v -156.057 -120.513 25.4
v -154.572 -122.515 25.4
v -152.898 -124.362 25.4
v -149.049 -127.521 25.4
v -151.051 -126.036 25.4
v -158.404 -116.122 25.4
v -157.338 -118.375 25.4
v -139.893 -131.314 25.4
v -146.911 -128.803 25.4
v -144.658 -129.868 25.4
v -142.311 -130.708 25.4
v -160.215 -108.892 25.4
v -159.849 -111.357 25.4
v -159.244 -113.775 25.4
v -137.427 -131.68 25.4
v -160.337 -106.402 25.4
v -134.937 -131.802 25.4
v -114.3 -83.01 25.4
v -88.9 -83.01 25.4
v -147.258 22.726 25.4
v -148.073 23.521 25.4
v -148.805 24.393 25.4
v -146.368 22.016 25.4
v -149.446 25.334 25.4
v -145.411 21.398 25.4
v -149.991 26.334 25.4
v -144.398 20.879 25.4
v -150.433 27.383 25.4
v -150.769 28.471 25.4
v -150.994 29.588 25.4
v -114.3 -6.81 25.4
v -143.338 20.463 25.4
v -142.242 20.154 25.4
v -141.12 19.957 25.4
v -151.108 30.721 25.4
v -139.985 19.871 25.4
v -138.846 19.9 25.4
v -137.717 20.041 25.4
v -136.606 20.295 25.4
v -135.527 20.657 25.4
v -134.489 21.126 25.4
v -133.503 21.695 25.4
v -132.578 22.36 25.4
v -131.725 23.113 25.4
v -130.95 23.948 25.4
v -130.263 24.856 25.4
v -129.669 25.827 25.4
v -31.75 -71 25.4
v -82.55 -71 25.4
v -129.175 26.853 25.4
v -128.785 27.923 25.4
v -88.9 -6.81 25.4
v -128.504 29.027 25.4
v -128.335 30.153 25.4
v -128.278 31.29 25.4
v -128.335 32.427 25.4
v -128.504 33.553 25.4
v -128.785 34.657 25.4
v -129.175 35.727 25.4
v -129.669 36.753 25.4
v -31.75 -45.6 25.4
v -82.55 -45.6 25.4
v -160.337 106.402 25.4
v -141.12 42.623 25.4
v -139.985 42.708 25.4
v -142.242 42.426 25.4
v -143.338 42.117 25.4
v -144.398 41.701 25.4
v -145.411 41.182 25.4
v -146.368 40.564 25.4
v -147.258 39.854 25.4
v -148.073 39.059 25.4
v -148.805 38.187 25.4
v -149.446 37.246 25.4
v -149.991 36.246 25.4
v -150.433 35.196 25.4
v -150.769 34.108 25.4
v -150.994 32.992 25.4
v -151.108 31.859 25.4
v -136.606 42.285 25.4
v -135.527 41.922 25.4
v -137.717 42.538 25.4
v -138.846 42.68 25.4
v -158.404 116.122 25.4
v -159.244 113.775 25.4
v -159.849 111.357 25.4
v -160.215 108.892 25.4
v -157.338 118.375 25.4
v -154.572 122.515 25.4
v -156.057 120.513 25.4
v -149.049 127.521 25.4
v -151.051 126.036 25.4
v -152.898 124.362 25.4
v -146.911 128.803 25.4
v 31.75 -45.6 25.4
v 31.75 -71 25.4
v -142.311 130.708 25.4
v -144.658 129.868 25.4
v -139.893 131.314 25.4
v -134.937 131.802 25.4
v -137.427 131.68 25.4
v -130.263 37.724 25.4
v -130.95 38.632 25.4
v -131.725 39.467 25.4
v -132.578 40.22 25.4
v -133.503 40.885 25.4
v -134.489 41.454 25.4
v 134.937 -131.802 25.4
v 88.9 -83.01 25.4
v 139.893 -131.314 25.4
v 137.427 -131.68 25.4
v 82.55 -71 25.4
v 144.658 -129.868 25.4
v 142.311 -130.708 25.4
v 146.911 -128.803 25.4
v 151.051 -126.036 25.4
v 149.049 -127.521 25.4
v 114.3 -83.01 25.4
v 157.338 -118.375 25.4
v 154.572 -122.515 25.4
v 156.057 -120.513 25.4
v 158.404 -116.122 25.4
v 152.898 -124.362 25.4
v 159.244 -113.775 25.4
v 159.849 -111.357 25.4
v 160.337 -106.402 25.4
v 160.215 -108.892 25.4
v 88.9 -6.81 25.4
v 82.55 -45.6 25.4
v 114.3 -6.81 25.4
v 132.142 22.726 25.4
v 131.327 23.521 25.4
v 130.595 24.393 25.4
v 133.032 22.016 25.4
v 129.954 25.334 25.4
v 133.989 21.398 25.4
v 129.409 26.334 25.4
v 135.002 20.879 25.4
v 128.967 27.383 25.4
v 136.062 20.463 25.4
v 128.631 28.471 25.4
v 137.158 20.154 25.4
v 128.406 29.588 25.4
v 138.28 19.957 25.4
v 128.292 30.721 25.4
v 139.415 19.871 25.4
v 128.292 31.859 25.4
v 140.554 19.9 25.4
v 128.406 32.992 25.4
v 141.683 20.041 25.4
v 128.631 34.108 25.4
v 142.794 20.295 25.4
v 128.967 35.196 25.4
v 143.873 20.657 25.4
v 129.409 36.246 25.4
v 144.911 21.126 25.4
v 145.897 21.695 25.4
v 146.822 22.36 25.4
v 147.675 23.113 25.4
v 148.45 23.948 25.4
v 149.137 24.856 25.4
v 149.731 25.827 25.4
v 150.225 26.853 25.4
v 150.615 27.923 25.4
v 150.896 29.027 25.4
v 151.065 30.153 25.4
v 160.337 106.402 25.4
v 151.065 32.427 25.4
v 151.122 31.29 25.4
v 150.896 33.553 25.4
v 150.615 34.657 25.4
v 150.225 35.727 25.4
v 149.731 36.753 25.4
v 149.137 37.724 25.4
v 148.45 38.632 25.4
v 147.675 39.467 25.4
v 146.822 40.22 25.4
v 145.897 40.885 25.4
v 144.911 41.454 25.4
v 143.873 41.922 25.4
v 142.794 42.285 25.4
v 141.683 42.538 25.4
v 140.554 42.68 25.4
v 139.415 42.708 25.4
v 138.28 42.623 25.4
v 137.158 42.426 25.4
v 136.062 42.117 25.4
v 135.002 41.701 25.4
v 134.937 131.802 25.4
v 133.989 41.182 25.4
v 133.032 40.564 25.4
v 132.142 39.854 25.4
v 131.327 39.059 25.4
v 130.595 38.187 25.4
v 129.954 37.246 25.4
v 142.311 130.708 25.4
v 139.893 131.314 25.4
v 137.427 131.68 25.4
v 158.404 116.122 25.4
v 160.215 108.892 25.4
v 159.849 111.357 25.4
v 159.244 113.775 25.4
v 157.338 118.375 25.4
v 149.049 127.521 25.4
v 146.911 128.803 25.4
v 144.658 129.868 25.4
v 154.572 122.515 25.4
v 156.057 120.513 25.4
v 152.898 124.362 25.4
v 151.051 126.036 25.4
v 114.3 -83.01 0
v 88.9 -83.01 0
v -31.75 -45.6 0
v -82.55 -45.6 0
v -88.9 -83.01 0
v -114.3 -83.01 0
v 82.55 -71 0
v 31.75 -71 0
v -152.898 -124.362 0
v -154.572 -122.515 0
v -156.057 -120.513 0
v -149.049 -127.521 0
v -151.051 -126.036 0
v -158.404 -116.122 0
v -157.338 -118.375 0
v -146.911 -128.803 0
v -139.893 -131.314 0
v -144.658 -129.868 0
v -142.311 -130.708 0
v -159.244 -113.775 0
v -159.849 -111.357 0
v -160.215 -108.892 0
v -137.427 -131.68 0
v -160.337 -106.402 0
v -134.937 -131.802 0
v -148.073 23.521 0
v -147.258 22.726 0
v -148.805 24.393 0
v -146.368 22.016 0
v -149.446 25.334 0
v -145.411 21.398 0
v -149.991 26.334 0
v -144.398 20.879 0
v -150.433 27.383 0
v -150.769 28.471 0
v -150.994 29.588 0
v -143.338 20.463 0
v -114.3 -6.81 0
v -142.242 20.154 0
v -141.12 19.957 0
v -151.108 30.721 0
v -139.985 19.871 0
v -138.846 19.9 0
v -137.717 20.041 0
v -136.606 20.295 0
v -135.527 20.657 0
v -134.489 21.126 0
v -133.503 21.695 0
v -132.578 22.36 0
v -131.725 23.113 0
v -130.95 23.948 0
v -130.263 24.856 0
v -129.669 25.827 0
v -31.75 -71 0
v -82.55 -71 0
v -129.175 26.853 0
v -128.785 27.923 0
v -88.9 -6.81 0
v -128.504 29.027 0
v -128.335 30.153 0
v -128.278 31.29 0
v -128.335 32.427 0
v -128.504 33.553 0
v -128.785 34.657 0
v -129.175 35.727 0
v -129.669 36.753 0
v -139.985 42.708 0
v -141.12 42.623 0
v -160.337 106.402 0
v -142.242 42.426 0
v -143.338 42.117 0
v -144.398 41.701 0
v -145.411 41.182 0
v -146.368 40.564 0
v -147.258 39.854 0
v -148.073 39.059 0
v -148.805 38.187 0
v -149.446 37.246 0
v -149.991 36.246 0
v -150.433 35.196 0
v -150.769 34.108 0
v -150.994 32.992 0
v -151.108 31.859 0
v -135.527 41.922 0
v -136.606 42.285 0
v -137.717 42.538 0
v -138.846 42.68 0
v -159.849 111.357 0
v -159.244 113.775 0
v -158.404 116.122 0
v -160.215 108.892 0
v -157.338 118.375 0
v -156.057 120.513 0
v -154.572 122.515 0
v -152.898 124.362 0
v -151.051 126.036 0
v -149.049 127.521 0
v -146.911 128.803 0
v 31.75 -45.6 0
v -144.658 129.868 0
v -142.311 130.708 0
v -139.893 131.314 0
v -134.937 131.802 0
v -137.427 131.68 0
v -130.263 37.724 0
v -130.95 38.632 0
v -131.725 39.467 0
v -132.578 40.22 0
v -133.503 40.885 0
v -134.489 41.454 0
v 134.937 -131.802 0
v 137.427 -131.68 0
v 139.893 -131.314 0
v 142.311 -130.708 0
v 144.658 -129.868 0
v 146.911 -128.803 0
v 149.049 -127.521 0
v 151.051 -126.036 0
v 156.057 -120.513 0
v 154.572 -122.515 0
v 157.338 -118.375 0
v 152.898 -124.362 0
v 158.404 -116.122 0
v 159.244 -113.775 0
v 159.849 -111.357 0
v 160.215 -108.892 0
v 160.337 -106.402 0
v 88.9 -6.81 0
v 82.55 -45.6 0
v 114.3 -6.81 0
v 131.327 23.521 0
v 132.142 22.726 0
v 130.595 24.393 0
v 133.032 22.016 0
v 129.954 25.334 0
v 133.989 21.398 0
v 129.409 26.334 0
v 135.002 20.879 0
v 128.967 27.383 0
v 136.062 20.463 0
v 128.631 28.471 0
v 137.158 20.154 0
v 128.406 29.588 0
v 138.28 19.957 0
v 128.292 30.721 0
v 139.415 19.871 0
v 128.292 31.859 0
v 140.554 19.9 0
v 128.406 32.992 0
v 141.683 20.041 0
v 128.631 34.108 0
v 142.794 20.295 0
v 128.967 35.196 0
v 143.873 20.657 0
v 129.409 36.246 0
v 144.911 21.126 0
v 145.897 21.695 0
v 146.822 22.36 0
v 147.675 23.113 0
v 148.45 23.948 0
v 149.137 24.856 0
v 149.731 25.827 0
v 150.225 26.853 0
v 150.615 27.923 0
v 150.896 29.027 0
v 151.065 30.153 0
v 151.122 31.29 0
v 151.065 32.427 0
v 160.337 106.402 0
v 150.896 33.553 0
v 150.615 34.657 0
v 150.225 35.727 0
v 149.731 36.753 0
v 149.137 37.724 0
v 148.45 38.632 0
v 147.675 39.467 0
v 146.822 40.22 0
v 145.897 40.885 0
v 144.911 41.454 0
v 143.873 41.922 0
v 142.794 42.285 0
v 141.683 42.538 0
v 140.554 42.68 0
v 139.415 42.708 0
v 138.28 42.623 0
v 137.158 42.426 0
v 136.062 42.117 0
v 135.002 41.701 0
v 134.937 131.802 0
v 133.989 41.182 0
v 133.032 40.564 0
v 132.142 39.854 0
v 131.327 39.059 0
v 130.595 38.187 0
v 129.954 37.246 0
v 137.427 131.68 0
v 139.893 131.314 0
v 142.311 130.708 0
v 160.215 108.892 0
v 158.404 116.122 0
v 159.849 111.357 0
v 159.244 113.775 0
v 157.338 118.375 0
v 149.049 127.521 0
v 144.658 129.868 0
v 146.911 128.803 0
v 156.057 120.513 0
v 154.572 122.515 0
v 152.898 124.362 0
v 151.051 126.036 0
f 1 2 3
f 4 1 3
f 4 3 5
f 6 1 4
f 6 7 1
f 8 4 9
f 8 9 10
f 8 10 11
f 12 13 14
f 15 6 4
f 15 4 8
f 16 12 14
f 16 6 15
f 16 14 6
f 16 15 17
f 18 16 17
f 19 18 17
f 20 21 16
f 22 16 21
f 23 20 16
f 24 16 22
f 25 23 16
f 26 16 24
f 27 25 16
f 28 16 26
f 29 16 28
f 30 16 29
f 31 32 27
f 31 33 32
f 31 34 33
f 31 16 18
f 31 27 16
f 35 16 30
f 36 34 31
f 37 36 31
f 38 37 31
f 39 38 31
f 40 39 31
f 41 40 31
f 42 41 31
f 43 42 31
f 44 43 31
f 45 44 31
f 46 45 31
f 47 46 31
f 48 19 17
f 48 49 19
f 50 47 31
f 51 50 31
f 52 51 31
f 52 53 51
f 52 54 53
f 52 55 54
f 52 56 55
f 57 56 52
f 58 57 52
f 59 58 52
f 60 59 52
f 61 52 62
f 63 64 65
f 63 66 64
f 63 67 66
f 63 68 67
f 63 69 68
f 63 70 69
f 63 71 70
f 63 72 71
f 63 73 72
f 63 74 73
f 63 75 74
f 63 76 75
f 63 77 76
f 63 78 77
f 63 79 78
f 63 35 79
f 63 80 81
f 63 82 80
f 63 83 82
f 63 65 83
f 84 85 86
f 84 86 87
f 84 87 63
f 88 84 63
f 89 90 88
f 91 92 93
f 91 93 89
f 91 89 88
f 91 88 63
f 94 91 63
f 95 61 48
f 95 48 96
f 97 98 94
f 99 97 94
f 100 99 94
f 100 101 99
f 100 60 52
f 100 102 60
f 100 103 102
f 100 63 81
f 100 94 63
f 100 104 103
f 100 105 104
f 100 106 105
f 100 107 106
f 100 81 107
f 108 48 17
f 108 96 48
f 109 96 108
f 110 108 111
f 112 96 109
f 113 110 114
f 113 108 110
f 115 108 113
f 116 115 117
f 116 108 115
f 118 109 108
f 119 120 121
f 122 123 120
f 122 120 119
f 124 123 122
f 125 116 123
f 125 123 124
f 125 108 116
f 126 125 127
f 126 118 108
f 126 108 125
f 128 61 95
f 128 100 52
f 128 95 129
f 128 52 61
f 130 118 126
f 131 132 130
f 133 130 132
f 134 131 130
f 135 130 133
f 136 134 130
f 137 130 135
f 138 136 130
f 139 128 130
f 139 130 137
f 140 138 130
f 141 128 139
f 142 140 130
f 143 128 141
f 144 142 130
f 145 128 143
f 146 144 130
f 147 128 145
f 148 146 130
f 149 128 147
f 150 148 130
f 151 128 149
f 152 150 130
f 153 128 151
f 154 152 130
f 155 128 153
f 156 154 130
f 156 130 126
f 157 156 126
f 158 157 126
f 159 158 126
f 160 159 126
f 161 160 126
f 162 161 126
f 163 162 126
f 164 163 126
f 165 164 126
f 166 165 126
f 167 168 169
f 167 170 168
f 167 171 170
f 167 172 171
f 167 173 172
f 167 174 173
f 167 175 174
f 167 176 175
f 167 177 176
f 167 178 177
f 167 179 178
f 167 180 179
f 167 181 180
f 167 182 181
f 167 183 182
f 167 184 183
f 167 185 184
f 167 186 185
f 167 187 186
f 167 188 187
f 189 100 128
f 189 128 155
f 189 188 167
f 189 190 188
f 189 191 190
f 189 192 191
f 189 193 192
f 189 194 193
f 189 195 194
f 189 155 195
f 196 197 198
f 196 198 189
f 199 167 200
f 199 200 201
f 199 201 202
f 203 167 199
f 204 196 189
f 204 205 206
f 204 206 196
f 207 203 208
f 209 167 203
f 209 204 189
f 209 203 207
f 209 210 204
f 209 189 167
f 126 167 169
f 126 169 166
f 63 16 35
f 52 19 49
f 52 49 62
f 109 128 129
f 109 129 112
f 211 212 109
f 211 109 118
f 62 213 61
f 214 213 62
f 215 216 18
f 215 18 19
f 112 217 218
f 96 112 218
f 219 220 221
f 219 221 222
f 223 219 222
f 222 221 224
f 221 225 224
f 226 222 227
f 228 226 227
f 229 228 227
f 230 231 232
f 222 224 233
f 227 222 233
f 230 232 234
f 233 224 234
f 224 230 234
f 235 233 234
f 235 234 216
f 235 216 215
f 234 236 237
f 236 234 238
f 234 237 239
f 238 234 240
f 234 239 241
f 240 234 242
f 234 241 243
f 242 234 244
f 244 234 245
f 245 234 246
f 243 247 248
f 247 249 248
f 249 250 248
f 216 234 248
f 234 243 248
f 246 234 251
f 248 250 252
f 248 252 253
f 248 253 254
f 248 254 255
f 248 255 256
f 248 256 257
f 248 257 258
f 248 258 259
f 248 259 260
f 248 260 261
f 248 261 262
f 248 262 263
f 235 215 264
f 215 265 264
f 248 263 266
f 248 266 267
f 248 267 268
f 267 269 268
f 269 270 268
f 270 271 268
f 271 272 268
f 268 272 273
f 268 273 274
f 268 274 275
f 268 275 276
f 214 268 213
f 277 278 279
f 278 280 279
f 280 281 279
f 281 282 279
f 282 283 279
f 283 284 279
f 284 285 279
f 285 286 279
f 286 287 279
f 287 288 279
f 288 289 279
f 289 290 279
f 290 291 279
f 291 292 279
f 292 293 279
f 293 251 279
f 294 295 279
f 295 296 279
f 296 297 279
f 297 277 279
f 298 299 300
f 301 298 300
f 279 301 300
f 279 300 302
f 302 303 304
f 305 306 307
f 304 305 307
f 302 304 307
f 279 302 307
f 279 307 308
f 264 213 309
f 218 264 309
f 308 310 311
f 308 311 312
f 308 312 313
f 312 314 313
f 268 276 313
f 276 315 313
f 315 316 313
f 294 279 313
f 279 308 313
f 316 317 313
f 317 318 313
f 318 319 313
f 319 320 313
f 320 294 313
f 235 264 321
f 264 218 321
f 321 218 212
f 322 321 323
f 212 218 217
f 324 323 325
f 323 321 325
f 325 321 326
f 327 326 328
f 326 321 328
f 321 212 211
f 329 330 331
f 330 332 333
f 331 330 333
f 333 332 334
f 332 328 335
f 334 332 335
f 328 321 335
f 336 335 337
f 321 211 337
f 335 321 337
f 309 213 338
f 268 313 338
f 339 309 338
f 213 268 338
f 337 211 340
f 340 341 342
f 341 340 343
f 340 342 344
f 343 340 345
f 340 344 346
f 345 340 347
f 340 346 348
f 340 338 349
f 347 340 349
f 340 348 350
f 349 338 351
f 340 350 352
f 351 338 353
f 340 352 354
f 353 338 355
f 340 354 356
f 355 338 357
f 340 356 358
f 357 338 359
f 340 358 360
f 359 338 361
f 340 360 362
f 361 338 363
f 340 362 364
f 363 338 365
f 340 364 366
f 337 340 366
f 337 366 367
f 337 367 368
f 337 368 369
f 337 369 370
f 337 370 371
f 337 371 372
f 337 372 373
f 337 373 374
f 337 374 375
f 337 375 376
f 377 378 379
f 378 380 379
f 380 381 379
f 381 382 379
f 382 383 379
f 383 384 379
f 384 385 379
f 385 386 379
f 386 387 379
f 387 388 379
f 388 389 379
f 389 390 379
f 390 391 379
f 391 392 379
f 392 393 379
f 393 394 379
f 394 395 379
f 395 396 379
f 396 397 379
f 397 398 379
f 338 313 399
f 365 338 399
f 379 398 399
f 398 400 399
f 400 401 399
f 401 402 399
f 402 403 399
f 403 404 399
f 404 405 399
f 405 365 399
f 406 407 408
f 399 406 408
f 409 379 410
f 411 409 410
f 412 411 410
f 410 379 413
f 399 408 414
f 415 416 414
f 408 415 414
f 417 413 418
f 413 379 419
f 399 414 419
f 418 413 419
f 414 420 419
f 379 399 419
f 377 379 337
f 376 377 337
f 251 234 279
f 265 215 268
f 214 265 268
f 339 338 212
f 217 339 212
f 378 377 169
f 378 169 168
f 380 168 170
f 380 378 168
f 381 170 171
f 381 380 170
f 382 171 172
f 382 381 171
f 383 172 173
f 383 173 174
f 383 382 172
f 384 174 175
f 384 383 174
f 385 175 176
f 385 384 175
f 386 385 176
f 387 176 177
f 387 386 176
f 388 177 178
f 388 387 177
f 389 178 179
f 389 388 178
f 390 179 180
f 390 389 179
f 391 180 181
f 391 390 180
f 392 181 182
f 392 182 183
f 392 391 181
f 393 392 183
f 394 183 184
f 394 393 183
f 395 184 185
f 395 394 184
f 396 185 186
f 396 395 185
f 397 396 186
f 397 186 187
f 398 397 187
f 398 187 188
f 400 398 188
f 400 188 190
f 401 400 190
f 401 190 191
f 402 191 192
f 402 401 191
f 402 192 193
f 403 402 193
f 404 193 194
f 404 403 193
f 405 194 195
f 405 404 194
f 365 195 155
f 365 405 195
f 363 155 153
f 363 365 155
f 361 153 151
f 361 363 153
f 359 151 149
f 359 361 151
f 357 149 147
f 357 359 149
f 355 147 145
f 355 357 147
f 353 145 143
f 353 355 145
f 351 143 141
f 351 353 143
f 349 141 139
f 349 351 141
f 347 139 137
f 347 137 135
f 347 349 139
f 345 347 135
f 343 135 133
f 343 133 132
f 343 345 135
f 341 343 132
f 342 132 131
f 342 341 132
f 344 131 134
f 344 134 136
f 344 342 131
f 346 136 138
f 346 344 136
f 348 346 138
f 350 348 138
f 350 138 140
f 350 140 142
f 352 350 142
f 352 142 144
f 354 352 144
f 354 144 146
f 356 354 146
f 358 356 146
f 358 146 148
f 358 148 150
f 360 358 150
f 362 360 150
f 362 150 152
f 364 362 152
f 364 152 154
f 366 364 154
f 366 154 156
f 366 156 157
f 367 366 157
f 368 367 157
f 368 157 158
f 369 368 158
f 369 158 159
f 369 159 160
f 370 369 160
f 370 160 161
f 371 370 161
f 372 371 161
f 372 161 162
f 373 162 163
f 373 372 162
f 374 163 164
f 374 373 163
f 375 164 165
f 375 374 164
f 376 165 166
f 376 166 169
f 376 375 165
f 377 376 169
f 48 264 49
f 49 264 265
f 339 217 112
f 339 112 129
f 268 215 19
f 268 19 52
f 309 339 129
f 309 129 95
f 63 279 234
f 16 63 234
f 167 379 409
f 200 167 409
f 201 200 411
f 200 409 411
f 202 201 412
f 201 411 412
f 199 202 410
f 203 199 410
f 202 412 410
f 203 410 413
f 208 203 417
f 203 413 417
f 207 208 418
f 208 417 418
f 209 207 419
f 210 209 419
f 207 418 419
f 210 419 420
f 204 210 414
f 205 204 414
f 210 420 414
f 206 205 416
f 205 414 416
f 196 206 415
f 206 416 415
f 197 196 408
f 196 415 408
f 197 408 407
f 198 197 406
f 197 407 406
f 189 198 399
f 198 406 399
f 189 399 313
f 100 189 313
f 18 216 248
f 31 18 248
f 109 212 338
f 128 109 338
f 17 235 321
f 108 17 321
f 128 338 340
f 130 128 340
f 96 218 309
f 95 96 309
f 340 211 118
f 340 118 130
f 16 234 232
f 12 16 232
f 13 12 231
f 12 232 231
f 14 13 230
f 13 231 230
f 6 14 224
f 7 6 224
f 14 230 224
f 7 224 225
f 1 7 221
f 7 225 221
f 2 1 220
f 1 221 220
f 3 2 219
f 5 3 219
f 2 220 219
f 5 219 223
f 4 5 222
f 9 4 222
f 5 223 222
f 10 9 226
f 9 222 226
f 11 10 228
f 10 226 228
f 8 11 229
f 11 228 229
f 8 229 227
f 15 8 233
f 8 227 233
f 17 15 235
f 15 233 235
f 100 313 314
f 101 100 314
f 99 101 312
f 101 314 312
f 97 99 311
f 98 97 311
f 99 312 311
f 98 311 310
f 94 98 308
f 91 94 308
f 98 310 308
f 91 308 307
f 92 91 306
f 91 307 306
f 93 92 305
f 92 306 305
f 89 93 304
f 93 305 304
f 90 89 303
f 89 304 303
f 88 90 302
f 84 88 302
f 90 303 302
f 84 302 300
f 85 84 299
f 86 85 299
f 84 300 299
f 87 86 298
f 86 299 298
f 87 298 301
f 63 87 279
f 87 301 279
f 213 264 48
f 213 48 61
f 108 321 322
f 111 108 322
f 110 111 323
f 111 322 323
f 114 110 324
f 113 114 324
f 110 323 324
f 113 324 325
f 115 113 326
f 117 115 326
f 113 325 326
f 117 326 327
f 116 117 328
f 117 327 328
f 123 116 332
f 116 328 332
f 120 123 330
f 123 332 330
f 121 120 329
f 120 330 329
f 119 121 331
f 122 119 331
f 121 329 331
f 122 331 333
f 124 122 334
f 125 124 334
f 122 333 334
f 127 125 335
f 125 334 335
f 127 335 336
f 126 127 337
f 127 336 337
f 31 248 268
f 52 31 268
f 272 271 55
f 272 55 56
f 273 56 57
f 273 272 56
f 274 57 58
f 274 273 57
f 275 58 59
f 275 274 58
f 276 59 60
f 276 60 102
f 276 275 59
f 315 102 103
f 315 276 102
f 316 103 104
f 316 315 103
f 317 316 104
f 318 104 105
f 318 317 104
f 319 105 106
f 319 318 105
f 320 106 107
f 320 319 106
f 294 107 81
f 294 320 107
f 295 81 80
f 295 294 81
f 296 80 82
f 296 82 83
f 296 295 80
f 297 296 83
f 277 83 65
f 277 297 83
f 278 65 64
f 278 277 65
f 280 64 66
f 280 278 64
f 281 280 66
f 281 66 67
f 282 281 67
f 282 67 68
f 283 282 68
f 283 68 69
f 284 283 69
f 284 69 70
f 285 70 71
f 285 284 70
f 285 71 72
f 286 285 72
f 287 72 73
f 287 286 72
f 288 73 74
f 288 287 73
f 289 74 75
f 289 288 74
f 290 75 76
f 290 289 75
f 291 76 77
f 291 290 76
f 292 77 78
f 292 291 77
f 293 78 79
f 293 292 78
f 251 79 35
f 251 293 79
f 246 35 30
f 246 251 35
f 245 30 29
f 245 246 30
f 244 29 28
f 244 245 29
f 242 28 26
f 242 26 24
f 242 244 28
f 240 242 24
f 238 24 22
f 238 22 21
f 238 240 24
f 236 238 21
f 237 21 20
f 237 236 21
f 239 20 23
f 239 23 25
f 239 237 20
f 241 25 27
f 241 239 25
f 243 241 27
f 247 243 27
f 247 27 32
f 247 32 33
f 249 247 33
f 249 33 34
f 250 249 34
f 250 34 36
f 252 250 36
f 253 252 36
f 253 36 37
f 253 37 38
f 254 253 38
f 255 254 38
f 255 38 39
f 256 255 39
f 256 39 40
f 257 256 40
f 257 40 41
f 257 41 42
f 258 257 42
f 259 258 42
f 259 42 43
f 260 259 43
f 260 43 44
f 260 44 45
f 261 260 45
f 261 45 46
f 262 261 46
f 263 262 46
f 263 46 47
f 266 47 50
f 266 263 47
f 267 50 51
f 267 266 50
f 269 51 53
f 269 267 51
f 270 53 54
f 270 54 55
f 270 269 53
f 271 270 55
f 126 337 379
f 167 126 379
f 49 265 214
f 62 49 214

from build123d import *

# Parameters (mm, degrees)
SKETCH1_R                      = 11.422
BOSS_EXTRUDE1_DEPTH            = 25.4
SKETCH2_W                      = 50.8
SKETCH2_H                      = 25.4
FOAM_INSERT_CUT_THROUGHS_DEPTH = 25.4
SKETCH3_W                      = 25.4
SKETCH3_H                      = 76.2
CUT_EXTRUDE1_DEPTH             = 25.4


with BuildPart() as part:
    # Sketch1 → Boss-Extrude1 (new body)
    with BuildSketch(Plane.XY):
        with BuildLine():
            Line((-134.937453137, -131.801904544), (134.937453137, -131.801904544))
            ThreePointArc((134.937453137, -131.801904544), (152.897965379, -124.362416786), (160.337453137, -106.401904544))
            Line((160.337453137, -106.401904544), (160.337453137, 106.401904544))
            ThreePointArc((160.337453137, 106.401904544), (152.897965379, 124.362416786), (134.937453137, 131.801904544))
            Line((134.937453137, 131.801904544), (-134.937453137, 131.801904544))
            ThreePointArc((-134.937453137, 131.801904544), (-152.897965379, 124.362416786), (-160.337453137, 106.401904544))
            Line((-160.337453137, 106.401904544), (-160.337453137, -106.401904544))
            ThreePointArc((-160.337453137, -106.401904544), (-152.897965379, -124.362416786), (-134.937453137, -131.801904544))
        make_face()
        with Locations((-139.7, 31.289898812)):
            Circle(SKETCH1_R, mode=Mode.SUBTRACT)
        with Locations((139.7, 31.289898812)):
            Circle(SKETCH1_R, mode=Mode.SUBTRACT)
    extrude(amount=BOSS_EXTRUDE1_DEPTH)

    # Sketch2 → Foam Insert Cut-Throughs (cut)
    with BuildSketch(Plane(origin=(0, 0, 0), x_dir=(-1, 0, 0), z_dir=(0, 0, -1))):
        with Locations((-57.15, -58.30002437)):
            Rectangle(SKETCH2_W, SKETCH2_H)
        with Locations((57.15, -58.30002437)):
            Rectangle(SKETCH2_W, SKETCH2_H)
    extrude(amount=-FOAM_INSERT_CUT_THROUGHS_DEPTH, mode=Mode.SUBTRACT)

    # Sketch3 (on Front Plane) → Cut-Extrude1 (cut)
    with BuildSketch(Plane.XY):
        with Locations((-101.6, -44.910101188)):
            Rectangle(SKETCH3_W, SKETCH3_H)
        with Locations((101.6, -44.910101188)):
            Rectangle(SKETCH3_W, SKETCH3_H)
    extrude(amount=CUT_EXTRUDE1_DEPTH, mode=Mode.SUBTRACT)


solid = part.part
